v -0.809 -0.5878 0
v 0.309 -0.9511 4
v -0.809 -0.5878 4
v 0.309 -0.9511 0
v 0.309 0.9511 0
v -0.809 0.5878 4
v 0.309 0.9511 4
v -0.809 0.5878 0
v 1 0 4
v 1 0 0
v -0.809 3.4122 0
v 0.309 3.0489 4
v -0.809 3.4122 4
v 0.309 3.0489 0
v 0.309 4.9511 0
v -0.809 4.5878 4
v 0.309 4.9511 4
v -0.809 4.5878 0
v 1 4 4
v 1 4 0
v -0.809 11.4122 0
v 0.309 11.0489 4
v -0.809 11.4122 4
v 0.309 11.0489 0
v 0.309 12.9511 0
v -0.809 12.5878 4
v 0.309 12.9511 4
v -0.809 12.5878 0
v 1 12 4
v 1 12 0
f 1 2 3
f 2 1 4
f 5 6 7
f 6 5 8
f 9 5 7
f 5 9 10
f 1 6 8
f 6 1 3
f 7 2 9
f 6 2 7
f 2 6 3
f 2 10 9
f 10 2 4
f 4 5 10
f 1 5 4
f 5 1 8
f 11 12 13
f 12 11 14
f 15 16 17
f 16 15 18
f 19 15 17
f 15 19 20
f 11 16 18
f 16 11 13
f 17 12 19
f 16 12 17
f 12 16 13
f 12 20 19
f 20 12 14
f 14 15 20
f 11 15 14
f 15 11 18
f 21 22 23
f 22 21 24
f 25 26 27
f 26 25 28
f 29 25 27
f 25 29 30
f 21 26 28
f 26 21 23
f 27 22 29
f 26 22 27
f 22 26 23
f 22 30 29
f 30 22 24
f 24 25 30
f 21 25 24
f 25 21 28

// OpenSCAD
union() {
	translate([0, 0, 0]) cylinder(r=1, h=4);
	translate([0, 4, 0]) cylinder(r=1, h=4);
	translate([0, 12, 0]) cylinder(r=1, h=4);
}
